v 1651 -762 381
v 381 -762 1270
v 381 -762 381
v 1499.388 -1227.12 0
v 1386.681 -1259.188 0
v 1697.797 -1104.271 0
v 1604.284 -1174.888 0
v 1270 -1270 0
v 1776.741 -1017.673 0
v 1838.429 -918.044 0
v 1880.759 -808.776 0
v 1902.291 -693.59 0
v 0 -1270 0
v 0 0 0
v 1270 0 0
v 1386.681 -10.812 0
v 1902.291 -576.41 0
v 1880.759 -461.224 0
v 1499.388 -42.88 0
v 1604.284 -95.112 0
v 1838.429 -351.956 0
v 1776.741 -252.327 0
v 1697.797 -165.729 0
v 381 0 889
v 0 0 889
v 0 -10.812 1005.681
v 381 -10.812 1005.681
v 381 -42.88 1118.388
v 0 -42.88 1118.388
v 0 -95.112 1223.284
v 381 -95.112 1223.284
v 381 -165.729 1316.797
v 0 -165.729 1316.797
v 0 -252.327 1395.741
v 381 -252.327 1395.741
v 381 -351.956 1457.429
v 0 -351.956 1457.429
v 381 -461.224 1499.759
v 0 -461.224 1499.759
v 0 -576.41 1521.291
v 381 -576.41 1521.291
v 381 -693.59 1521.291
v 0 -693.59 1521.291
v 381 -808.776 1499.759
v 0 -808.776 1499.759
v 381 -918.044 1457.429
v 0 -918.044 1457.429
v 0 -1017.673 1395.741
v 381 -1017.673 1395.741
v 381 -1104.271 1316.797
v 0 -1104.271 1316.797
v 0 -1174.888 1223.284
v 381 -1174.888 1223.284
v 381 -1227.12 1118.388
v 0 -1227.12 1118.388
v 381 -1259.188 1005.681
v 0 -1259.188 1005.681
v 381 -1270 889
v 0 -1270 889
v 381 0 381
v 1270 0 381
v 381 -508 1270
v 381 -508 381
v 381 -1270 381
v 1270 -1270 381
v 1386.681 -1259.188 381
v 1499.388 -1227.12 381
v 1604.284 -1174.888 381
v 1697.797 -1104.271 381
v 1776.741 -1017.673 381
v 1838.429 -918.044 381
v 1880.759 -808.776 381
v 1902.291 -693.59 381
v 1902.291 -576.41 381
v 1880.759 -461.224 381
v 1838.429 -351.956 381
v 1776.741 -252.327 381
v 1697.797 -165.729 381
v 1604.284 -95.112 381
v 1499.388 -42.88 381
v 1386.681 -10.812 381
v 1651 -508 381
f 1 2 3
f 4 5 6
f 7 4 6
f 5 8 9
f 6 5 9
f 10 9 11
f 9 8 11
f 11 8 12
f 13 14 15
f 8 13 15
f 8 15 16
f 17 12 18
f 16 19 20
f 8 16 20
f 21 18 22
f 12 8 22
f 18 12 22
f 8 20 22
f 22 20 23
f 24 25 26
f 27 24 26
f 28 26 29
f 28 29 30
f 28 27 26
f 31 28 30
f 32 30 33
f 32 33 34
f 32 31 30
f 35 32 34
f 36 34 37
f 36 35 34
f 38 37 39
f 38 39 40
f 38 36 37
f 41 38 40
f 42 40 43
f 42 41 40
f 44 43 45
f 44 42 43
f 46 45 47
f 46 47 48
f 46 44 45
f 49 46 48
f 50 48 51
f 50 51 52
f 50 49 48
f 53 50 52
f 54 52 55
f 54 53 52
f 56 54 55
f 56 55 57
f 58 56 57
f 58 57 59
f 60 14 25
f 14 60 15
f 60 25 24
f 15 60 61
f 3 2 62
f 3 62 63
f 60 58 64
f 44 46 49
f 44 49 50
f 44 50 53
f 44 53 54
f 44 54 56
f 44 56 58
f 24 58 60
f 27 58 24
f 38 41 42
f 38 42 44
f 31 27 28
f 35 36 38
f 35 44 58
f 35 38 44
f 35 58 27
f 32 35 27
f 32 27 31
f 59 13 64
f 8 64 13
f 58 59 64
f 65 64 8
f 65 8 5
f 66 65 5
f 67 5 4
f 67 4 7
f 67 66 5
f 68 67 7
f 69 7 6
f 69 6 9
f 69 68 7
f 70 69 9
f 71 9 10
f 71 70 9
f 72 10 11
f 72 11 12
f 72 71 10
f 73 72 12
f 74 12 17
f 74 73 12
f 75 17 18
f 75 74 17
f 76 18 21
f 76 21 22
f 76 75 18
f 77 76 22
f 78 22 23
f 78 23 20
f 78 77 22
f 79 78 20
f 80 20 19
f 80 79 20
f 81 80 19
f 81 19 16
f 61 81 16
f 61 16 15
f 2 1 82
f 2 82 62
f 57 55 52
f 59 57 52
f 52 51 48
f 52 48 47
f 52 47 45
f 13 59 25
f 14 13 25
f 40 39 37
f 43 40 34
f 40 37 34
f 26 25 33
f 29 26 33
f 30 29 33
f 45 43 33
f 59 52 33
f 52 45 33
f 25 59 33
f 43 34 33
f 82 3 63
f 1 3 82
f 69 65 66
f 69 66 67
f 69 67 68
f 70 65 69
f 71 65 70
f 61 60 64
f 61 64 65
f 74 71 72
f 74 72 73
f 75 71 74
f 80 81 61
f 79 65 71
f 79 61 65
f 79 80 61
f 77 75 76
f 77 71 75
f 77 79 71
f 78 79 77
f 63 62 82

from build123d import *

# Parameters (mm, degrees)
F1_DEPTH = 1270
F3_DEPTH = 381
F5_DEPTH = 381
F7_START = -508
F7_DEPTH = 254


# Not quite as in the source:
# - a feature names something its author has since deleted; it is built from what else it names


with BuildPart() as f1:
    # F0 (on Front) → F1 (new body)
    with BuildSketch(Plane.XZ):
        Polygon((0, 889), (0, 0), (1270, 0), (1270, 381), (381, 381), (381, 889), align=None)
    extrude(amount=F1_DEPTH)

    # F2 (on face) → F3 (join, through all)
    with BuildSketch(Plane.YZ.offset(381)):
        with BuildLine():
            Line((-1270, 889), (0, 889))
            ThreePointArc((0, 889), (-635, 1524), (-1270, 889))
        make_face()
    extrude(amount=-F3_DEPTH)

    # F4 (on face) → F5 (join, through all)
    with BuildSketch(Plane.XY.offset(381)):
        with BuildLine():
            Line((1270, 0), (1270, -1270))
            ThreePointArc((1270, -1270), (1905, -635), (1270, 0))
        make_face()
    extrude(amount=-F5_DEPTH)


with BuildPart() as f7:
    # F6 (on face) → F7 (new body)
    with BuildSketch(Plane.XZ.offset(1270).offset(F7_START)):
        Polygon((1651, 381), (381, 1270), (381, 889), (381, 381), (1270, 381), align=None)
    extrude(amount=-F7_DEPTH)


solid = Compound([f1.part, f7.part])
